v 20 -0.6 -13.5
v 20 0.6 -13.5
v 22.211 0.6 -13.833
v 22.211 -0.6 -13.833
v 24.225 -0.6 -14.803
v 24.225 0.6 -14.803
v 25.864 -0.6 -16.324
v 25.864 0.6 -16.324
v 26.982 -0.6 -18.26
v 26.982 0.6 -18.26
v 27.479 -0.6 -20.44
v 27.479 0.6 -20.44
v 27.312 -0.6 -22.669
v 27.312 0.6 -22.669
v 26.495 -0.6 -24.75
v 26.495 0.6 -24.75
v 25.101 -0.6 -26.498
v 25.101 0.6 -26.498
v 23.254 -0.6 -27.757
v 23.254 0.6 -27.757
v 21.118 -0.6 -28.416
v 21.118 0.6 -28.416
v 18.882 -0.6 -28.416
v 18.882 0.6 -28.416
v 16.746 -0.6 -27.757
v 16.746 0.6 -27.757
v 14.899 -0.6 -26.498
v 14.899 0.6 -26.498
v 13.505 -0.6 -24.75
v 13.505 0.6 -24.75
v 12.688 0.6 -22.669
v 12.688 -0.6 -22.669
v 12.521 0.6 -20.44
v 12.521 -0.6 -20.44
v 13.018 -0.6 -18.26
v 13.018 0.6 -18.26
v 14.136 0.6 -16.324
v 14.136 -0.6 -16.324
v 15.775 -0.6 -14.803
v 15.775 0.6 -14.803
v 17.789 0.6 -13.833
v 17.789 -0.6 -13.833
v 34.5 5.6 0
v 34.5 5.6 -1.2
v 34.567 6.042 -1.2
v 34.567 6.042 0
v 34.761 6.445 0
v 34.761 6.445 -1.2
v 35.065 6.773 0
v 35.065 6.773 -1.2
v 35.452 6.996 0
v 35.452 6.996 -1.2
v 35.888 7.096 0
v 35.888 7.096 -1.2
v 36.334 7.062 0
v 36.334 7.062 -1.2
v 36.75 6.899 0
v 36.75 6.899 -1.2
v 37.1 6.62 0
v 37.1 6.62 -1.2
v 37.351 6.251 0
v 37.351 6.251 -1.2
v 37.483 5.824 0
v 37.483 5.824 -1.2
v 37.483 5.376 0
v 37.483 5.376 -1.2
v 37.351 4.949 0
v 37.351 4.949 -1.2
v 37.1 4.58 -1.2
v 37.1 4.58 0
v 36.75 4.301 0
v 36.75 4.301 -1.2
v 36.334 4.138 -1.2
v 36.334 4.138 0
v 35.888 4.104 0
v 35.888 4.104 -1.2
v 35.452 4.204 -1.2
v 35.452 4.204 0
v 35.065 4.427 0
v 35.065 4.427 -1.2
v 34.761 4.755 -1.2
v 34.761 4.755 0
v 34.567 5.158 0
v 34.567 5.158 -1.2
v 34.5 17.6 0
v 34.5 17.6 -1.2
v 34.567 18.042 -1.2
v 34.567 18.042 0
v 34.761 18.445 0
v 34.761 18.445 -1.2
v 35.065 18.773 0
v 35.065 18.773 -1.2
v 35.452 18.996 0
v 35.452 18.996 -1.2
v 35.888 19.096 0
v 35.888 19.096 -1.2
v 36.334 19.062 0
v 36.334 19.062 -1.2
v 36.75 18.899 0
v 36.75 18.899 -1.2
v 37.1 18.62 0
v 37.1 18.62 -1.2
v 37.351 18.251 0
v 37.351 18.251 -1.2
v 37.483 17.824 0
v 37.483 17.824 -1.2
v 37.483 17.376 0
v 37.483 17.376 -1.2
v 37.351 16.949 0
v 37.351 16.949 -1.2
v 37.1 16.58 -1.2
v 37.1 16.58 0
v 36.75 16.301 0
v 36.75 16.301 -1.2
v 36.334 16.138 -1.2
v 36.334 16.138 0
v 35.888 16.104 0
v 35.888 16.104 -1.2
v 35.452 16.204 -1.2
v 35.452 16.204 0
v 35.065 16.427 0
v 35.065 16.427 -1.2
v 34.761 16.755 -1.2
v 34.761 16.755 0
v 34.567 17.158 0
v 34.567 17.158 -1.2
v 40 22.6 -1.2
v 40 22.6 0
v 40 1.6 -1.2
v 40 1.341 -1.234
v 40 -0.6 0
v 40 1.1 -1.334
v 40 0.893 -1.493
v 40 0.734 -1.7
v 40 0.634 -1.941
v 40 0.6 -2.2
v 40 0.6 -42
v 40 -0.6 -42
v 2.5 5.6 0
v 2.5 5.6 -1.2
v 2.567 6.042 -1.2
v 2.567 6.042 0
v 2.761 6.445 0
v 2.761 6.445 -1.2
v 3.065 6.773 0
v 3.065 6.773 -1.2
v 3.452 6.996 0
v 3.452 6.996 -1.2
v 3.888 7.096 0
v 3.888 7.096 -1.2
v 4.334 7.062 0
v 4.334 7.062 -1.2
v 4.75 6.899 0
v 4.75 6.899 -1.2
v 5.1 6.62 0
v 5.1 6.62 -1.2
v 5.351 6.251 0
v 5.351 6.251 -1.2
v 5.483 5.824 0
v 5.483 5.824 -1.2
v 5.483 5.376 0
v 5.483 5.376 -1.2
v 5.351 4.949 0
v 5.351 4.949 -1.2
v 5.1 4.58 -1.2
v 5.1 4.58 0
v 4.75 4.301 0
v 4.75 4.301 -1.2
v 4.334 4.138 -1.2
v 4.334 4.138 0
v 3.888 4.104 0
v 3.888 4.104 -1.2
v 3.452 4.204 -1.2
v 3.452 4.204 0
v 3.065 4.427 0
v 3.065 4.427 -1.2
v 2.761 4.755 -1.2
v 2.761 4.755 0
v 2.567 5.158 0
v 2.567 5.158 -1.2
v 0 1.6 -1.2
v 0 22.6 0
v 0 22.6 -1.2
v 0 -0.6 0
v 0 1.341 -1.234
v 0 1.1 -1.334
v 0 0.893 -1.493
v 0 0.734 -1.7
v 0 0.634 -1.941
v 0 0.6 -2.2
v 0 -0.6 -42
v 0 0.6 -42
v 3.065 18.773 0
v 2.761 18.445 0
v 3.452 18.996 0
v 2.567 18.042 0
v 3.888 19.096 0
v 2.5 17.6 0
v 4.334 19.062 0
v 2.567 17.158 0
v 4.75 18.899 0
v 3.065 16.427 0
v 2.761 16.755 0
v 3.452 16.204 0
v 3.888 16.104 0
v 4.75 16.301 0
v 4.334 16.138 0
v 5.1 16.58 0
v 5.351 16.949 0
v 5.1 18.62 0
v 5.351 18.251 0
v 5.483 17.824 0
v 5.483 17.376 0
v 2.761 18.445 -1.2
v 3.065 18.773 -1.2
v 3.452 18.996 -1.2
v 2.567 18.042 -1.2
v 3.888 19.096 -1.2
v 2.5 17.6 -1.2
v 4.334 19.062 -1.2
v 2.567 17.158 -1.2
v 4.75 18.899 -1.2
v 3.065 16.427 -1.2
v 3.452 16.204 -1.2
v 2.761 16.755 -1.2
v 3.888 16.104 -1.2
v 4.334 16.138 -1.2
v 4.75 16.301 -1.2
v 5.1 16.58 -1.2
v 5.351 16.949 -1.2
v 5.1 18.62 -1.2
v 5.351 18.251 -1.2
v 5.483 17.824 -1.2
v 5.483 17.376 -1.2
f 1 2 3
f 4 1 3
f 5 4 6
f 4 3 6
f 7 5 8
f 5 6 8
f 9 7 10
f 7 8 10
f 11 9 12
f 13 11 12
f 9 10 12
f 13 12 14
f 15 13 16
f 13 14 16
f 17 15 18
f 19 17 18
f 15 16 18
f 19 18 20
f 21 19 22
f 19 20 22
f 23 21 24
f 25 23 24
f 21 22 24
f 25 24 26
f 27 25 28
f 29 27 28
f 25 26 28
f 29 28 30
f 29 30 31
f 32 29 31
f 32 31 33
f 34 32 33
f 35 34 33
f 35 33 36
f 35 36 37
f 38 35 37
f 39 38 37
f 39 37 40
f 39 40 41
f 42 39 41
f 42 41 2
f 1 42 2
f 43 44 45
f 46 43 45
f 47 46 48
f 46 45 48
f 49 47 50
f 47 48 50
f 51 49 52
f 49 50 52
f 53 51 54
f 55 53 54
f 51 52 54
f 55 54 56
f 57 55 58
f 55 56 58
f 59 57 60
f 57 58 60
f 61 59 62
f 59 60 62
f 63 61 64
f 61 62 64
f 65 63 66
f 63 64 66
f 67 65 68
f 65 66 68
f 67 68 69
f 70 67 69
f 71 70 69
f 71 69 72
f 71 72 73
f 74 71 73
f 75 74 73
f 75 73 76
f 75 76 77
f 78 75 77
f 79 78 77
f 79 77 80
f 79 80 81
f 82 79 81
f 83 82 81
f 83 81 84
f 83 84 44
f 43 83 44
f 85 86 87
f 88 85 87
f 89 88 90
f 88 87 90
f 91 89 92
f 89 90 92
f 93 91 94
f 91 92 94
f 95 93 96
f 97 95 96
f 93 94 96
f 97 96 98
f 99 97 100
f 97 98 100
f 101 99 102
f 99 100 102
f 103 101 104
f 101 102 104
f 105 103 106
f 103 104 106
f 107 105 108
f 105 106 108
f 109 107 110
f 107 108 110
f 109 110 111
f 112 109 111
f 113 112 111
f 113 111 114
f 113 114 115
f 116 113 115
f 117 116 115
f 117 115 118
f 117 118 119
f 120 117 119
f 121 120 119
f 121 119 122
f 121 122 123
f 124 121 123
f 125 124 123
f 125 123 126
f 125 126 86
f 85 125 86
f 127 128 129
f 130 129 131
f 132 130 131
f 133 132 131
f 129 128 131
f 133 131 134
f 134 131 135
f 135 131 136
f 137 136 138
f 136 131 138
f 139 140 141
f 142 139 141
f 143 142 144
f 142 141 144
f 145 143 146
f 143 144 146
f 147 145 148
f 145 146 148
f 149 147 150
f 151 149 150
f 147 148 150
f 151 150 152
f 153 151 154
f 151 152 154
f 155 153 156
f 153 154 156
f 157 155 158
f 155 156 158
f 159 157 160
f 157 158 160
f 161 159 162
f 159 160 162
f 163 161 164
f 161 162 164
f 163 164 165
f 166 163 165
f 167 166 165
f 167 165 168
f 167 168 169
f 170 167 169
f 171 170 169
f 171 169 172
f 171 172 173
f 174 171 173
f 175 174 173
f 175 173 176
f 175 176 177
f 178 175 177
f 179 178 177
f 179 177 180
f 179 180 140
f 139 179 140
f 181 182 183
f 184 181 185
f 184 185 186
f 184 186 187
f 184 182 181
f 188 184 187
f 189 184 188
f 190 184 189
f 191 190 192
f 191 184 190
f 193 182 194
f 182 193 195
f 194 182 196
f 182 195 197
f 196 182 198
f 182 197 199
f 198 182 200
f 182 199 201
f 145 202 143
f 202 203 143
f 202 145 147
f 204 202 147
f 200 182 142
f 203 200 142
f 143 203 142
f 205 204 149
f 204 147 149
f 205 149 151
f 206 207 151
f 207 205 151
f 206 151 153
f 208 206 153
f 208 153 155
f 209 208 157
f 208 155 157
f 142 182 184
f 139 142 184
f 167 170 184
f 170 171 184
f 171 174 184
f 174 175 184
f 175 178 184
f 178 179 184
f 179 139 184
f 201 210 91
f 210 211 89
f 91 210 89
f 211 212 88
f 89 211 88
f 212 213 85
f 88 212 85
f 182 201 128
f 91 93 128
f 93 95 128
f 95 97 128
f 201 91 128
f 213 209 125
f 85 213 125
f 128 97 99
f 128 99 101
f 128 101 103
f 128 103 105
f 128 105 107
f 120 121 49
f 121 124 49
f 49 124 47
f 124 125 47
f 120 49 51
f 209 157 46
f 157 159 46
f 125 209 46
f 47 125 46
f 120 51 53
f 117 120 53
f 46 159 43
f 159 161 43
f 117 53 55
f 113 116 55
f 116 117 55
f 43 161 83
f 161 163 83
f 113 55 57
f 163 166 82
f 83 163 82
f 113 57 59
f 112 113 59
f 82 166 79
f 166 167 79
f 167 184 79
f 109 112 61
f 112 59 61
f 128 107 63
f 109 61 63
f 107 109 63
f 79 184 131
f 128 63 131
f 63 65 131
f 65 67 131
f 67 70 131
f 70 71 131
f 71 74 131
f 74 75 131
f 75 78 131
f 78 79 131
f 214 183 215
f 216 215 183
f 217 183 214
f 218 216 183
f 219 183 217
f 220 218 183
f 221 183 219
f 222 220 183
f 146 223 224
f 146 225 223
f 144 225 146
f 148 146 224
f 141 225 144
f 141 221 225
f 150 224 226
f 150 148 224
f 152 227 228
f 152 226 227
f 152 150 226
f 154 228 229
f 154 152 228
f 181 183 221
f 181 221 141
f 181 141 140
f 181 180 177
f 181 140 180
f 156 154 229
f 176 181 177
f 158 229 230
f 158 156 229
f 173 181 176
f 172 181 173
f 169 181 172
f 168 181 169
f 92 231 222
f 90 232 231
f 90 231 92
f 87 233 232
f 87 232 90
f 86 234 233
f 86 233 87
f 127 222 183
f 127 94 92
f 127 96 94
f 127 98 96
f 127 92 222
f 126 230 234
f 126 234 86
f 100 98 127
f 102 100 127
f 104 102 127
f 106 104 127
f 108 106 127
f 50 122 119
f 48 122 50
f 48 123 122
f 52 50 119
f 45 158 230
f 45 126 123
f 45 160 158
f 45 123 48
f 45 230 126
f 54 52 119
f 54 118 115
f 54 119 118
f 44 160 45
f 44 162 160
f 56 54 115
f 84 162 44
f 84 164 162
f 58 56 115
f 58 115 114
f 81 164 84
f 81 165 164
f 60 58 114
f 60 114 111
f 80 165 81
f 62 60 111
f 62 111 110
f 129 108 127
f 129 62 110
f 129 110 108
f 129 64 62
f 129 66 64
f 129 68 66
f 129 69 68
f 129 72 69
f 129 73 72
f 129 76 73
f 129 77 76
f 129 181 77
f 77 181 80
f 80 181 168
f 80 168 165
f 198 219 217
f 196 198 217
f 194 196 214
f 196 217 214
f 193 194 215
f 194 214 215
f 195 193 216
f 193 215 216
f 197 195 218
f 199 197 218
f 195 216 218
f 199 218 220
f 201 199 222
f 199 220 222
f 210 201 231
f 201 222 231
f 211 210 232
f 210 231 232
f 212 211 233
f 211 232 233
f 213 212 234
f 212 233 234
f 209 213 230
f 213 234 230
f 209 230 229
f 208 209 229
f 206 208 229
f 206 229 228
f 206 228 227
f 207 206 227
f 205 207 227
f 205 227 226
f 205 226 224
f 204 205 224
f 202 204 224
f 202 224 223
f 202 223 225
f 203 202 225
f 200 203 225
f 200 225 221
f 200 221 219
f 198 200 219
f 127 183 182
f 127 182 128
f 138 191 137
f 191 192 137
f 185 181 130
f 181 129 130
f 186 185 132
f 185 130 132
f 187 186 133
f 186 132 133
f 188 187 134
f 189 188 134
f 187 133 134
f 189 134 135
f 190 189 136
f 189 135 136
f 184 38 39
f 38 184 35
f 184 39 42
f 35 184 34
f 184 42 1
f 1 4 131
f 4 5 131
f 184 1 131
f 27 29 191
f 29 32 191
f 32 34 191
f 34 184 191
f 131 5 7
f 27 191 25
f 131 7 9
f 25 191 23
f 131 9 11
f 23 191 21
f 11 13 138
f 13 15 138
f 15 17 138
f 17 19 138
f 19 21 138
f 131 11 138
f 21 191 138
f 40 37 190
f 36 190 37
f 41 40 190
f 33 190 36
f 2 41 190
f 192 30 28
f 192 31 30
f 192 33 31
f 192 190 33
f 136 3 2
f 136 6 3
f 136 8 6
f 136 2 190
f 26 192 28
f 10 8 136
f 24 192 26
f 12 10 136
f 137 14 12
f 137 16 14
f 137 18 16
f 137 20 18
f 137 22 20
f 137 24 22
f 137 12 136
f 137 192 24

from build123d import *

# Parameters (mm, degrees)
SKETCH1_W           = 40
SKETCH1_H           = 42
BOSS_EXTRUDE1_DEPTH = 0.6
SKETCH3_R           = 7.5
CUT_EXTRUDE1_DEPTH  = 59.012412465
SKETCH4_W           = 40
SKETCH4_H           = 1.2
BOSS_EXTRUDE2_DEPTH = 22
SKETCH5_R           = 1.5
CUT_EXTRUDE2_DEPTH  = 62.444283705
FILLET1_R           = 1


with BuildPart() as part:
    # Sketch1 → Boss-Extrude1 (new, symmetric)
    with BuildSketch(Plane(origin=(0, 0, 0), x_dir=(1, 0, 0), z_dir=(0, 1, 0))):
        with Locations((20, 21)):
            Rectangle(SKETCH1_W, SKETCH1_H)
    extrude(amount=BOSS_EXTRUDE1_DEPTH, both=True)

    # Sketch3 → Cut-Extrude1 (cut, through all)
    with BuildSketch(Plane(origin=(0, 0.6, 0), x_dir=(1, 0, 0), z_dir=(0, 1, 0))):
        with Locations(Location((20, 21, 0), (0, 0, 270))):
            Circle(SKETCH3_R)
    extrude(amount=-CUT_EXTRUDE1_DEPTH, mode=Mode.SUBTRACT)

    # Sketch4 → Boss-Extrude2 (add)
    with BuildSketch(Plane(origin=(0, 0.6, 0), x_dir=(1, 0, 0), z_dir=(0, 1, 0))):
        with Locations((20, 0.6)):
            Rectangle(SKETCH4_W, SKETCH4_H)
    extrude(amount=BOSS_EXTRUDE2_DEPTH)

    # Sketch5 → Cut-Extrude2 (cut, through all)
    with BuildSketch(Plane(origin=(0, 0, -1.2), x_dir=(-1, 0, 0), z_dir=(0, 0, -1))):
        with Locations((-36, 17.6)):
            Circle(SKETCH5_R)
        with Locations((-36, 5.6)):
            Circle(SKETCH5_R)
        with Locations((-4, 17.6)):
            Circle(SKETCH5_R)
        with Locations((-4, 5.6)):
            Circle(SKETCH5_R)
    extrude(amount=-CUT_EXTRUDE2_DEPTH, mode=Mode.SUBTRACT)

    # Fillet1
    fillet1_edges = [part.edges().sort_by_distance(p)[0] for p in [
        (20, 0.6, -1.2),
    ]]
    fillet(fillet1_edges, radius=FILLET1_R)


solid = part.part
